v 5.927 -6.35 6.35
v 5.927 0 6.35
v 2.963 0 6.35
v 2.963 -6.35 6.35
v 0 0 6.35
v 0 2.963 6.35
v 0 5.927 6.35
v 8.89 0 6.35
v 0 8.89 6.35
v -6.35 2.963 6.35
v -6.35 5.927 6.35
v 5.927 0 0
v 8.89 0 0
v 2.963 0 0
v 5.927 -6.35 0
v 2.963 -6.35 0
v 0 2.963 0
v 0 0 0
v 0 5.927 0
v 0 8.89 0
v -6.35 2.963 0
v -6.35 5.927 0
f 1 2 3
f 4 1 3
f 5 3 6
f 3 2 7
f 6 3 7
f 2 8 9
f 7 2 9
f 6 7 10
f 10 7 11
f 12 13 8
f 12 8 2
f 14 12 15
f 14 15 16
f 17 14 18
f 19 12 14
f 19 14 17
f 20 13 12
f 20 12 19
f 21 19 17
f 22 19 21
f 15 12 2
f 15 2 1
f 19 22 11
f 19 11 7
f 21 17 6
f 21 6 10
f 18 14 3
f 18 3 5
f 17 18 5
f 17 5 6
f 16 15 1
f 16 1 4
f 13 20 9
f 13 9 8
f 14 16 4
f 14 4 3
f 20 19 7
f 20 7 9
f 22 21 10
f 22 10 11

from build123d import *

# Parameters (mm, degrees)
BOSS_EXTRUDE1_DEPTH = 6.35


with BuildPart() as part:
    # Sketch1 → Boss-Extrude1 (new body)
    with BuildSketch(Plane.XY):
        Polygon((0, 8.89), (8.89, 0), (5.926666667, 0), (5.926666667, -6.35), (2.963333333, -6.35), (2.963333333, 0), (0, 0), (0, 2.963333333), (-6.35, 2.963333333), (-6.35, 5.926666667), (0, 5.926666667), align=None)
    extrude(amount=BOSS_EXTRUDE1_DEPTH)


solid = part.part
